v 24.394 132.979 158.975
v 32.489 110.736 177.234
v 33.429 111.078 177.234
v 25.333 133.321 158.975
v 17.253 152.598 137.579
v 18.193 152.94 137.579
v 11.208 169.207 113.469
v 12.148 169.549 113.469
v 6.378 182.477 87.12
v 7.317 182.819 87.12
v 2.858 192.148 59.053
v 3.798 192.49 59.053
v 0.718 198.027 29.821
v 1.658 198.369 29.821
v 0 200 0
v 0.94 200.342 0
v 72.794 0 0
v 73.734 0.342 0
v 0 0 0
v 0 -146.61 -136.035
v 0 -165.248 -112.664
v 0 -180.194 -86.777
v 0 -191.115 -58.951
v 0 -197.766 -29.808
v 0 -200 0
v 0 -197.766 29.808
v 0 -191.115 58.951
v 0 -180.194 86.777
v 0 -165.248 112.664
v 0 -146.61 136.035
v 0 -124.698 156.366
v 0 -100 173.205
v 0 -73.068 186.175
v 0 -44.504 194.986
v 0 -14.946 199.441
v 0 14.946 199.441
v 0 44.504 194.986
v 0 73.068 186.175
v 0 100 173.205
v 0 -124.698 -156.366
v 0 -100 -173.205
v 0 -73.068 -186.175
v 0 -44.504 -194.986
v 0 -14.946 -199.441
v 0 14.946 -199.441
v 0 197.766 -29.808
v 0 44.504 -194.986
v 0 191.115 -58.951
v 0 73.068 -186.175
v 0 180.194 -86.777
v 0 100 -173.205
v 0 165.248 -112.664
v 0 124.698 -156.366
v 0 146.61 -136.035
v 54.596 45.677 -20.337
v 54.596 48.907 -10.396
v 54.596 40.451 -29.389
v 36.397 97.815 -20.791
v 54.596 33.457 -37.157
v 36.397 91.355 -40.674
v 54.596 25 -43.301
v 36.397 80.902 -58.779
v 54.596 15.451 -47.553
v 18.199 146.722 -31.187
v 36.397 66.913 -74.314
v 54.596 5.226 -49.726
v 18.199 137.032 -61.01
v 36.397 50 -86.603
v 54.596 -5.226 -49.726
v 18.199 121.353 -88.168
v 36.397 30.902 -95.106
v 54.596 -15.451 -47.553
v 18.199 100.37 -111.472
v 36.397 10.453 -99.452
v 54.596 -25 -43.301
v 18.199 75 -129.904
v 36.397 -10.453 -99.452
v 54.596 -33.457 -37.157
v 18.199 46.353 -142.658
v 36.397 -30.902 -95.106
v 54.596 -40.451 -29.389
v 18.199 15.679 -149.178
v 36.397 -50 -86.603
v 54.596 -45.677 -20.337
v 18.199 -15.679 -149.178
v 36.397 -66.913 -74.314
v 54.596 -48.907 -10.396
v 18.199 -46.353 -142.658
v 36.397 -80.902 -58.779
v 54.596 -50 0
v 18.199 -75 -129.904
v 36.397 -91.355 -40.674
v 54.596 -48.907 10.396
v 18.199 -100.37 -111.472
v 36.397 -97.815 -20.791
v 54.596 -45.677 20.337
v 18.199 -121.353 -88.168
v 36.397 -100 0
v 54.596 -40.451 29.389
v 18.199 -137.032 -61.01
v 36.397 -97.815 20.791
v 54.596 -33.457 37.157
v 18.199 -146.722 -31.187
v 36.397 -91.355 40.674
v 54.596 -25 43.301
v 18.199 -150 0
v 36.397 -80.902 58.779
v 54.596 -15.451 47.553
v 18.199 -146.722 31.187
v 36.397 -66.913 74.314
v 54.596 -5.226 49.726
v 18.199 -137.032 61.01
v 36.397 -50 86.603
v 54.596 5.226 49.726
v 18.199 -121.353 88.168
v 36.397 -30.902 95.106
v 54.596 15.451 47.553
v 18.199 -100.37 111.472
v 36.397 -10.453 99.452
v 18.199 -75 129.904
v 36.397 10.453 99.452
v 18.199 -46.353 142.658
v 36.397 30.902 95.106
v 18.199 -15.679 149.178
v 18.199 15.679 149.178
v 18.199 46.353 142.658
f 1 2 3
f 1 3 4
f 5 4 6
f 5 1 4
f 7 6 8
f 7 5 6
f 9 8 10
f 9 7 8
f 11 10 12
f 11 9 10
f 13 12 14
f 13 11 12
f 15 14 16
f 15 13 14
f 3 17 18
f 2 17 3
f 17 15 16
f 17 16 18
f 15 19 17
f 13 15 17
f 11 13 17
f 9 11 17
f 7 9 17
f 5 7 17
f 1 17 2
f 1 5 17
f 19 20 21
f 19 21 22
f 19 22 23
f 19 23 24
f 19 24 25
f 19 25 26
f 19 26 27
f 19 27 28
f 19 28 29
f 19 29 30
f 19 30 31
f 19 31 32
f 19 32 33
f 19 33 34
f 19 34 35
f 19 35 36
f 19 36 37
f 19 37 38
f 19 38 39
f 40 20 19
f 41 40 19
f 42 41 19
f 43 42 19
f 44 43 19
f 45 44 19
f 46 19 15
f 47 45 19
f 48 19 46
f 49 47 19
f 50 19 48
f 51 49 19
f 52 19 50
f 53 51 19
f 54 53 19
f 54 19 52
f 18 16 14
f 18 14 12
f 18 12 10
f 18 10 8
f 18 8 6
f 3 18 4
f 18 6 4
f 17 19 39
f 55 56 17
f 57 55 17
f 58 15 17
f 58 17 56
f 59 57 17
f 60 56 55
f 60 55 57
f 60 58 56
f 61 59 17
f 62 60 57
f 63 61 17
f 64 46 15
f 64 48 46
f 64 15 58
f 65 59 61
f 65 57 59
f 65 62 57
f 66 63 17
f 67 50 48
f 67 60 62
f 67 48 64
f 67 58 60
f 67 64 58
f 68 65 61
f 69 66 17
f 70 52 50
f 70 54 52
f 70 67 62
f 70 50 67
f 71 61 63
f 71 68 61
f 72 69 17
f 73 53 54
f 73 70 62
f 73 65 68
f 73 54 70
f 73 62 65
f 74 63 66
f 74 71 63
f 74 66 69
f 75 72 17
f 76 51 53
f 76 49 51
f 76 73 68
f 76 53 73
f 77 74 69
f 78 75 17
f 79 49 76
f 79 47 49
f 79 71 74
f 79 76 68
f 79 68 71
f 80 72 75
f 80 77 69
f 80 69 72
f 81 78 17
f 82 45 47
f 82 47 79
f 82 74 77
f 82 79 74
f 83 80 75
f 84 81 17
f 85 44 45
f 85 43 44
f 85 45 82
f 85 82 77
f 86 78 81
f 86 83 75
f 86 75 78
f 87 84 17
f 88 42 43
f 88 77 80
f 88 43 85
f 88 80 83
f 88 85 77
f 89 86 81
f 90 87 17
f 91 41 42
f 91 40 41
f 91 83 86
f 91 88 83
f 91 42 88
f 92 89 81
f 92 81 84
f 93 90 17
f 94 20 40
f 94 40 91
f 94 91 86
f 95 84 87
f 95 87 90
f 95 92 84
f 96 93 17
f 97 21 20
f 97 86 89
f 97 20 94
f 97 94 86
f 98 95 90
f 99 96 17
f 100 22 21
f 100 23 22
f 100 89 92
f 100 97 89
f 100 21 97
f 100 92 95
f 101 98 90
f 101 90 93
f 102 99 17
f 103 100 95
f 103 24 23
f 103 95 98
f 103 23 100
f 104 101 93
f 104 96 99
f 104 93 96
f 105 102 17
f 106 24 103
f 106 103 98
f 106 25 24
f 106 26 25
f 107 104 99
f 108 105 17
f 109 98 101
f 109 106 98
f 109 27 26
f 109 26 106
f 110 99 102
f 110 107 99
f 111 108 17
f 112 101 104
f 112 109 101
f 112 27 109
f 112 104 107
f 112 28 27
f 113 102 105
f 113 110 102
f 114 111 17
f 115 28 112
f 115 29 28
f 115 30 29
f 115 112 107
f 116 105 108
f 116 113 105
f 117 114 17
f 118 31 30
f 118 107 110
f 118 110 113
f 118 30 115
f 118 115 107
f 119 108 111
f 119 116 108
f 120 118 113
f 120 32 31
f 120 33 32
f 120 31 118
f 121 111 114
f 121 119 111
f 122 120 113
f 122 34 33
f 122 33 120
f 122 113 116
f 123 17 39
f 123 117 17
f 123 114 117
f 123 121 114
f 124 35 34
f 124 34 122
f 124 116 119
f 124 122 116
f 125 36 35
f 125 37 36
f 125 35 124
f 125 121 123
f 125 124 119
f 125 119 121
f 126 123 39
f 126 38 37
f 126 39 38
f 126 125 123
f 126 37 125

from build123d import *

# Parameters (mm, degrees)
R_VOLUTION1_ANGLE = 300
EXTRUSION1_DEPTH  = 1


with BuildPart() as part:
    # Esquisse1 → R_volution1 (revolve)
    with BuildSketch(Plane.XY):
        Polygon((0, 0), (72.794046853, 0), (0, 200), align=None)
    revolve(axis=Axis((0, 0, 0), (-1, 0, 0)), revolution_arc=R_VOLUTION1_ANGLE)

    # Esquisse2 → Extrusion1 (add)
    with BuildSketch(Plane(origin=(64.278760969, 23.395555688, 0), x_dir=(0, 0, -1), z_dir=(0.939692621, 0.342020143, 0))):
        with BuildLine():
            Line((0, -24.897030338), (-177.234129854, 92.946240459))
            ThreePointArc((-177.234129854, 92.946240459), (-100.542864923, 162.693229458), (0, 187.938524157))
            Line((0, 187.938524157), (0, -24.897030338))
        make_face()
    extrude(amount=EXTRUSION1_DEPTH)


solid = part.part
